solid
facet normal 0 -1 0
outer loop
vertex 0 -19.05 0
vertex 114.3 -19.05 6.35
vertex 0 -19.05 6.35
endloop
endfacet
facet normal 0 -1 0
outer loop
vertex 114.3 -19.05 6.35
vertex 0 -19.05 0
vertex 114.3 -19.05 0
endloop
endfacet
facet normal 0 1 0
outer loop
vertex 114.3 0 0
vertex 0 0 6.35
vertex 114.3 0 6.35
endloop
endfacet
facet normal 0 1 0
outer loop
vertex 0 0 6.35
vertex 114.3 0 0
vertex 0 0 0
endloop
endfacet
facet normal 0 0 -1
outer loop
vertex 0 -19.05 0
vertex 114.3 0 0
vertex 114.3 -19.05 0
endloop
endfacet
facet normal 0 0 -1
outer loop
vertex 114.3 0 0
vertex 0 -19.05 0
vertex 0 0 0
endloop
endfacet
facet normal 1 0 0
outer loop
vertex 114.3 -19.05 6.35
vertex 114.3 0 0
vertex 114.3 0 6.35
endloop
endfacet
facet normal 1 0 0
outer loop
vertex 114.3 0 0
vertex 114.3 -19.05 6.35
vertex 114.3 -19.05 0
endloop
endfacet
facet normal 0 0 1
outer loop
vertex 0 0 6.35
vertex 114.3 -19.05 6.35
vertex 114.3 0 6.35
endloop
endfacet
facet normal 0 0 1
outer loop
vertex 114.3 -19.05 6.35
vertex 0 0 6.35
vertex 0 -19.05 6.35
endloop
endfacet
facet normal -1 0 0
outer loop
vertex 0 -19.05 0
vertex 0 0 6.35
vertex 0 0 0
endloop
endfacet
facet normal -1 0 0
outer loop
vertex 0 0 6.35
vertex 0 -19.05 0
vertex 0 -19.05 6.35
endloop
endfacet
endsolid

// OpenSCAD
rotate(a=[90, 0, 0]){
    color("Blue"){
        cube(size=[114.3, 6.35, 19.049999999999997]);
    };
};
